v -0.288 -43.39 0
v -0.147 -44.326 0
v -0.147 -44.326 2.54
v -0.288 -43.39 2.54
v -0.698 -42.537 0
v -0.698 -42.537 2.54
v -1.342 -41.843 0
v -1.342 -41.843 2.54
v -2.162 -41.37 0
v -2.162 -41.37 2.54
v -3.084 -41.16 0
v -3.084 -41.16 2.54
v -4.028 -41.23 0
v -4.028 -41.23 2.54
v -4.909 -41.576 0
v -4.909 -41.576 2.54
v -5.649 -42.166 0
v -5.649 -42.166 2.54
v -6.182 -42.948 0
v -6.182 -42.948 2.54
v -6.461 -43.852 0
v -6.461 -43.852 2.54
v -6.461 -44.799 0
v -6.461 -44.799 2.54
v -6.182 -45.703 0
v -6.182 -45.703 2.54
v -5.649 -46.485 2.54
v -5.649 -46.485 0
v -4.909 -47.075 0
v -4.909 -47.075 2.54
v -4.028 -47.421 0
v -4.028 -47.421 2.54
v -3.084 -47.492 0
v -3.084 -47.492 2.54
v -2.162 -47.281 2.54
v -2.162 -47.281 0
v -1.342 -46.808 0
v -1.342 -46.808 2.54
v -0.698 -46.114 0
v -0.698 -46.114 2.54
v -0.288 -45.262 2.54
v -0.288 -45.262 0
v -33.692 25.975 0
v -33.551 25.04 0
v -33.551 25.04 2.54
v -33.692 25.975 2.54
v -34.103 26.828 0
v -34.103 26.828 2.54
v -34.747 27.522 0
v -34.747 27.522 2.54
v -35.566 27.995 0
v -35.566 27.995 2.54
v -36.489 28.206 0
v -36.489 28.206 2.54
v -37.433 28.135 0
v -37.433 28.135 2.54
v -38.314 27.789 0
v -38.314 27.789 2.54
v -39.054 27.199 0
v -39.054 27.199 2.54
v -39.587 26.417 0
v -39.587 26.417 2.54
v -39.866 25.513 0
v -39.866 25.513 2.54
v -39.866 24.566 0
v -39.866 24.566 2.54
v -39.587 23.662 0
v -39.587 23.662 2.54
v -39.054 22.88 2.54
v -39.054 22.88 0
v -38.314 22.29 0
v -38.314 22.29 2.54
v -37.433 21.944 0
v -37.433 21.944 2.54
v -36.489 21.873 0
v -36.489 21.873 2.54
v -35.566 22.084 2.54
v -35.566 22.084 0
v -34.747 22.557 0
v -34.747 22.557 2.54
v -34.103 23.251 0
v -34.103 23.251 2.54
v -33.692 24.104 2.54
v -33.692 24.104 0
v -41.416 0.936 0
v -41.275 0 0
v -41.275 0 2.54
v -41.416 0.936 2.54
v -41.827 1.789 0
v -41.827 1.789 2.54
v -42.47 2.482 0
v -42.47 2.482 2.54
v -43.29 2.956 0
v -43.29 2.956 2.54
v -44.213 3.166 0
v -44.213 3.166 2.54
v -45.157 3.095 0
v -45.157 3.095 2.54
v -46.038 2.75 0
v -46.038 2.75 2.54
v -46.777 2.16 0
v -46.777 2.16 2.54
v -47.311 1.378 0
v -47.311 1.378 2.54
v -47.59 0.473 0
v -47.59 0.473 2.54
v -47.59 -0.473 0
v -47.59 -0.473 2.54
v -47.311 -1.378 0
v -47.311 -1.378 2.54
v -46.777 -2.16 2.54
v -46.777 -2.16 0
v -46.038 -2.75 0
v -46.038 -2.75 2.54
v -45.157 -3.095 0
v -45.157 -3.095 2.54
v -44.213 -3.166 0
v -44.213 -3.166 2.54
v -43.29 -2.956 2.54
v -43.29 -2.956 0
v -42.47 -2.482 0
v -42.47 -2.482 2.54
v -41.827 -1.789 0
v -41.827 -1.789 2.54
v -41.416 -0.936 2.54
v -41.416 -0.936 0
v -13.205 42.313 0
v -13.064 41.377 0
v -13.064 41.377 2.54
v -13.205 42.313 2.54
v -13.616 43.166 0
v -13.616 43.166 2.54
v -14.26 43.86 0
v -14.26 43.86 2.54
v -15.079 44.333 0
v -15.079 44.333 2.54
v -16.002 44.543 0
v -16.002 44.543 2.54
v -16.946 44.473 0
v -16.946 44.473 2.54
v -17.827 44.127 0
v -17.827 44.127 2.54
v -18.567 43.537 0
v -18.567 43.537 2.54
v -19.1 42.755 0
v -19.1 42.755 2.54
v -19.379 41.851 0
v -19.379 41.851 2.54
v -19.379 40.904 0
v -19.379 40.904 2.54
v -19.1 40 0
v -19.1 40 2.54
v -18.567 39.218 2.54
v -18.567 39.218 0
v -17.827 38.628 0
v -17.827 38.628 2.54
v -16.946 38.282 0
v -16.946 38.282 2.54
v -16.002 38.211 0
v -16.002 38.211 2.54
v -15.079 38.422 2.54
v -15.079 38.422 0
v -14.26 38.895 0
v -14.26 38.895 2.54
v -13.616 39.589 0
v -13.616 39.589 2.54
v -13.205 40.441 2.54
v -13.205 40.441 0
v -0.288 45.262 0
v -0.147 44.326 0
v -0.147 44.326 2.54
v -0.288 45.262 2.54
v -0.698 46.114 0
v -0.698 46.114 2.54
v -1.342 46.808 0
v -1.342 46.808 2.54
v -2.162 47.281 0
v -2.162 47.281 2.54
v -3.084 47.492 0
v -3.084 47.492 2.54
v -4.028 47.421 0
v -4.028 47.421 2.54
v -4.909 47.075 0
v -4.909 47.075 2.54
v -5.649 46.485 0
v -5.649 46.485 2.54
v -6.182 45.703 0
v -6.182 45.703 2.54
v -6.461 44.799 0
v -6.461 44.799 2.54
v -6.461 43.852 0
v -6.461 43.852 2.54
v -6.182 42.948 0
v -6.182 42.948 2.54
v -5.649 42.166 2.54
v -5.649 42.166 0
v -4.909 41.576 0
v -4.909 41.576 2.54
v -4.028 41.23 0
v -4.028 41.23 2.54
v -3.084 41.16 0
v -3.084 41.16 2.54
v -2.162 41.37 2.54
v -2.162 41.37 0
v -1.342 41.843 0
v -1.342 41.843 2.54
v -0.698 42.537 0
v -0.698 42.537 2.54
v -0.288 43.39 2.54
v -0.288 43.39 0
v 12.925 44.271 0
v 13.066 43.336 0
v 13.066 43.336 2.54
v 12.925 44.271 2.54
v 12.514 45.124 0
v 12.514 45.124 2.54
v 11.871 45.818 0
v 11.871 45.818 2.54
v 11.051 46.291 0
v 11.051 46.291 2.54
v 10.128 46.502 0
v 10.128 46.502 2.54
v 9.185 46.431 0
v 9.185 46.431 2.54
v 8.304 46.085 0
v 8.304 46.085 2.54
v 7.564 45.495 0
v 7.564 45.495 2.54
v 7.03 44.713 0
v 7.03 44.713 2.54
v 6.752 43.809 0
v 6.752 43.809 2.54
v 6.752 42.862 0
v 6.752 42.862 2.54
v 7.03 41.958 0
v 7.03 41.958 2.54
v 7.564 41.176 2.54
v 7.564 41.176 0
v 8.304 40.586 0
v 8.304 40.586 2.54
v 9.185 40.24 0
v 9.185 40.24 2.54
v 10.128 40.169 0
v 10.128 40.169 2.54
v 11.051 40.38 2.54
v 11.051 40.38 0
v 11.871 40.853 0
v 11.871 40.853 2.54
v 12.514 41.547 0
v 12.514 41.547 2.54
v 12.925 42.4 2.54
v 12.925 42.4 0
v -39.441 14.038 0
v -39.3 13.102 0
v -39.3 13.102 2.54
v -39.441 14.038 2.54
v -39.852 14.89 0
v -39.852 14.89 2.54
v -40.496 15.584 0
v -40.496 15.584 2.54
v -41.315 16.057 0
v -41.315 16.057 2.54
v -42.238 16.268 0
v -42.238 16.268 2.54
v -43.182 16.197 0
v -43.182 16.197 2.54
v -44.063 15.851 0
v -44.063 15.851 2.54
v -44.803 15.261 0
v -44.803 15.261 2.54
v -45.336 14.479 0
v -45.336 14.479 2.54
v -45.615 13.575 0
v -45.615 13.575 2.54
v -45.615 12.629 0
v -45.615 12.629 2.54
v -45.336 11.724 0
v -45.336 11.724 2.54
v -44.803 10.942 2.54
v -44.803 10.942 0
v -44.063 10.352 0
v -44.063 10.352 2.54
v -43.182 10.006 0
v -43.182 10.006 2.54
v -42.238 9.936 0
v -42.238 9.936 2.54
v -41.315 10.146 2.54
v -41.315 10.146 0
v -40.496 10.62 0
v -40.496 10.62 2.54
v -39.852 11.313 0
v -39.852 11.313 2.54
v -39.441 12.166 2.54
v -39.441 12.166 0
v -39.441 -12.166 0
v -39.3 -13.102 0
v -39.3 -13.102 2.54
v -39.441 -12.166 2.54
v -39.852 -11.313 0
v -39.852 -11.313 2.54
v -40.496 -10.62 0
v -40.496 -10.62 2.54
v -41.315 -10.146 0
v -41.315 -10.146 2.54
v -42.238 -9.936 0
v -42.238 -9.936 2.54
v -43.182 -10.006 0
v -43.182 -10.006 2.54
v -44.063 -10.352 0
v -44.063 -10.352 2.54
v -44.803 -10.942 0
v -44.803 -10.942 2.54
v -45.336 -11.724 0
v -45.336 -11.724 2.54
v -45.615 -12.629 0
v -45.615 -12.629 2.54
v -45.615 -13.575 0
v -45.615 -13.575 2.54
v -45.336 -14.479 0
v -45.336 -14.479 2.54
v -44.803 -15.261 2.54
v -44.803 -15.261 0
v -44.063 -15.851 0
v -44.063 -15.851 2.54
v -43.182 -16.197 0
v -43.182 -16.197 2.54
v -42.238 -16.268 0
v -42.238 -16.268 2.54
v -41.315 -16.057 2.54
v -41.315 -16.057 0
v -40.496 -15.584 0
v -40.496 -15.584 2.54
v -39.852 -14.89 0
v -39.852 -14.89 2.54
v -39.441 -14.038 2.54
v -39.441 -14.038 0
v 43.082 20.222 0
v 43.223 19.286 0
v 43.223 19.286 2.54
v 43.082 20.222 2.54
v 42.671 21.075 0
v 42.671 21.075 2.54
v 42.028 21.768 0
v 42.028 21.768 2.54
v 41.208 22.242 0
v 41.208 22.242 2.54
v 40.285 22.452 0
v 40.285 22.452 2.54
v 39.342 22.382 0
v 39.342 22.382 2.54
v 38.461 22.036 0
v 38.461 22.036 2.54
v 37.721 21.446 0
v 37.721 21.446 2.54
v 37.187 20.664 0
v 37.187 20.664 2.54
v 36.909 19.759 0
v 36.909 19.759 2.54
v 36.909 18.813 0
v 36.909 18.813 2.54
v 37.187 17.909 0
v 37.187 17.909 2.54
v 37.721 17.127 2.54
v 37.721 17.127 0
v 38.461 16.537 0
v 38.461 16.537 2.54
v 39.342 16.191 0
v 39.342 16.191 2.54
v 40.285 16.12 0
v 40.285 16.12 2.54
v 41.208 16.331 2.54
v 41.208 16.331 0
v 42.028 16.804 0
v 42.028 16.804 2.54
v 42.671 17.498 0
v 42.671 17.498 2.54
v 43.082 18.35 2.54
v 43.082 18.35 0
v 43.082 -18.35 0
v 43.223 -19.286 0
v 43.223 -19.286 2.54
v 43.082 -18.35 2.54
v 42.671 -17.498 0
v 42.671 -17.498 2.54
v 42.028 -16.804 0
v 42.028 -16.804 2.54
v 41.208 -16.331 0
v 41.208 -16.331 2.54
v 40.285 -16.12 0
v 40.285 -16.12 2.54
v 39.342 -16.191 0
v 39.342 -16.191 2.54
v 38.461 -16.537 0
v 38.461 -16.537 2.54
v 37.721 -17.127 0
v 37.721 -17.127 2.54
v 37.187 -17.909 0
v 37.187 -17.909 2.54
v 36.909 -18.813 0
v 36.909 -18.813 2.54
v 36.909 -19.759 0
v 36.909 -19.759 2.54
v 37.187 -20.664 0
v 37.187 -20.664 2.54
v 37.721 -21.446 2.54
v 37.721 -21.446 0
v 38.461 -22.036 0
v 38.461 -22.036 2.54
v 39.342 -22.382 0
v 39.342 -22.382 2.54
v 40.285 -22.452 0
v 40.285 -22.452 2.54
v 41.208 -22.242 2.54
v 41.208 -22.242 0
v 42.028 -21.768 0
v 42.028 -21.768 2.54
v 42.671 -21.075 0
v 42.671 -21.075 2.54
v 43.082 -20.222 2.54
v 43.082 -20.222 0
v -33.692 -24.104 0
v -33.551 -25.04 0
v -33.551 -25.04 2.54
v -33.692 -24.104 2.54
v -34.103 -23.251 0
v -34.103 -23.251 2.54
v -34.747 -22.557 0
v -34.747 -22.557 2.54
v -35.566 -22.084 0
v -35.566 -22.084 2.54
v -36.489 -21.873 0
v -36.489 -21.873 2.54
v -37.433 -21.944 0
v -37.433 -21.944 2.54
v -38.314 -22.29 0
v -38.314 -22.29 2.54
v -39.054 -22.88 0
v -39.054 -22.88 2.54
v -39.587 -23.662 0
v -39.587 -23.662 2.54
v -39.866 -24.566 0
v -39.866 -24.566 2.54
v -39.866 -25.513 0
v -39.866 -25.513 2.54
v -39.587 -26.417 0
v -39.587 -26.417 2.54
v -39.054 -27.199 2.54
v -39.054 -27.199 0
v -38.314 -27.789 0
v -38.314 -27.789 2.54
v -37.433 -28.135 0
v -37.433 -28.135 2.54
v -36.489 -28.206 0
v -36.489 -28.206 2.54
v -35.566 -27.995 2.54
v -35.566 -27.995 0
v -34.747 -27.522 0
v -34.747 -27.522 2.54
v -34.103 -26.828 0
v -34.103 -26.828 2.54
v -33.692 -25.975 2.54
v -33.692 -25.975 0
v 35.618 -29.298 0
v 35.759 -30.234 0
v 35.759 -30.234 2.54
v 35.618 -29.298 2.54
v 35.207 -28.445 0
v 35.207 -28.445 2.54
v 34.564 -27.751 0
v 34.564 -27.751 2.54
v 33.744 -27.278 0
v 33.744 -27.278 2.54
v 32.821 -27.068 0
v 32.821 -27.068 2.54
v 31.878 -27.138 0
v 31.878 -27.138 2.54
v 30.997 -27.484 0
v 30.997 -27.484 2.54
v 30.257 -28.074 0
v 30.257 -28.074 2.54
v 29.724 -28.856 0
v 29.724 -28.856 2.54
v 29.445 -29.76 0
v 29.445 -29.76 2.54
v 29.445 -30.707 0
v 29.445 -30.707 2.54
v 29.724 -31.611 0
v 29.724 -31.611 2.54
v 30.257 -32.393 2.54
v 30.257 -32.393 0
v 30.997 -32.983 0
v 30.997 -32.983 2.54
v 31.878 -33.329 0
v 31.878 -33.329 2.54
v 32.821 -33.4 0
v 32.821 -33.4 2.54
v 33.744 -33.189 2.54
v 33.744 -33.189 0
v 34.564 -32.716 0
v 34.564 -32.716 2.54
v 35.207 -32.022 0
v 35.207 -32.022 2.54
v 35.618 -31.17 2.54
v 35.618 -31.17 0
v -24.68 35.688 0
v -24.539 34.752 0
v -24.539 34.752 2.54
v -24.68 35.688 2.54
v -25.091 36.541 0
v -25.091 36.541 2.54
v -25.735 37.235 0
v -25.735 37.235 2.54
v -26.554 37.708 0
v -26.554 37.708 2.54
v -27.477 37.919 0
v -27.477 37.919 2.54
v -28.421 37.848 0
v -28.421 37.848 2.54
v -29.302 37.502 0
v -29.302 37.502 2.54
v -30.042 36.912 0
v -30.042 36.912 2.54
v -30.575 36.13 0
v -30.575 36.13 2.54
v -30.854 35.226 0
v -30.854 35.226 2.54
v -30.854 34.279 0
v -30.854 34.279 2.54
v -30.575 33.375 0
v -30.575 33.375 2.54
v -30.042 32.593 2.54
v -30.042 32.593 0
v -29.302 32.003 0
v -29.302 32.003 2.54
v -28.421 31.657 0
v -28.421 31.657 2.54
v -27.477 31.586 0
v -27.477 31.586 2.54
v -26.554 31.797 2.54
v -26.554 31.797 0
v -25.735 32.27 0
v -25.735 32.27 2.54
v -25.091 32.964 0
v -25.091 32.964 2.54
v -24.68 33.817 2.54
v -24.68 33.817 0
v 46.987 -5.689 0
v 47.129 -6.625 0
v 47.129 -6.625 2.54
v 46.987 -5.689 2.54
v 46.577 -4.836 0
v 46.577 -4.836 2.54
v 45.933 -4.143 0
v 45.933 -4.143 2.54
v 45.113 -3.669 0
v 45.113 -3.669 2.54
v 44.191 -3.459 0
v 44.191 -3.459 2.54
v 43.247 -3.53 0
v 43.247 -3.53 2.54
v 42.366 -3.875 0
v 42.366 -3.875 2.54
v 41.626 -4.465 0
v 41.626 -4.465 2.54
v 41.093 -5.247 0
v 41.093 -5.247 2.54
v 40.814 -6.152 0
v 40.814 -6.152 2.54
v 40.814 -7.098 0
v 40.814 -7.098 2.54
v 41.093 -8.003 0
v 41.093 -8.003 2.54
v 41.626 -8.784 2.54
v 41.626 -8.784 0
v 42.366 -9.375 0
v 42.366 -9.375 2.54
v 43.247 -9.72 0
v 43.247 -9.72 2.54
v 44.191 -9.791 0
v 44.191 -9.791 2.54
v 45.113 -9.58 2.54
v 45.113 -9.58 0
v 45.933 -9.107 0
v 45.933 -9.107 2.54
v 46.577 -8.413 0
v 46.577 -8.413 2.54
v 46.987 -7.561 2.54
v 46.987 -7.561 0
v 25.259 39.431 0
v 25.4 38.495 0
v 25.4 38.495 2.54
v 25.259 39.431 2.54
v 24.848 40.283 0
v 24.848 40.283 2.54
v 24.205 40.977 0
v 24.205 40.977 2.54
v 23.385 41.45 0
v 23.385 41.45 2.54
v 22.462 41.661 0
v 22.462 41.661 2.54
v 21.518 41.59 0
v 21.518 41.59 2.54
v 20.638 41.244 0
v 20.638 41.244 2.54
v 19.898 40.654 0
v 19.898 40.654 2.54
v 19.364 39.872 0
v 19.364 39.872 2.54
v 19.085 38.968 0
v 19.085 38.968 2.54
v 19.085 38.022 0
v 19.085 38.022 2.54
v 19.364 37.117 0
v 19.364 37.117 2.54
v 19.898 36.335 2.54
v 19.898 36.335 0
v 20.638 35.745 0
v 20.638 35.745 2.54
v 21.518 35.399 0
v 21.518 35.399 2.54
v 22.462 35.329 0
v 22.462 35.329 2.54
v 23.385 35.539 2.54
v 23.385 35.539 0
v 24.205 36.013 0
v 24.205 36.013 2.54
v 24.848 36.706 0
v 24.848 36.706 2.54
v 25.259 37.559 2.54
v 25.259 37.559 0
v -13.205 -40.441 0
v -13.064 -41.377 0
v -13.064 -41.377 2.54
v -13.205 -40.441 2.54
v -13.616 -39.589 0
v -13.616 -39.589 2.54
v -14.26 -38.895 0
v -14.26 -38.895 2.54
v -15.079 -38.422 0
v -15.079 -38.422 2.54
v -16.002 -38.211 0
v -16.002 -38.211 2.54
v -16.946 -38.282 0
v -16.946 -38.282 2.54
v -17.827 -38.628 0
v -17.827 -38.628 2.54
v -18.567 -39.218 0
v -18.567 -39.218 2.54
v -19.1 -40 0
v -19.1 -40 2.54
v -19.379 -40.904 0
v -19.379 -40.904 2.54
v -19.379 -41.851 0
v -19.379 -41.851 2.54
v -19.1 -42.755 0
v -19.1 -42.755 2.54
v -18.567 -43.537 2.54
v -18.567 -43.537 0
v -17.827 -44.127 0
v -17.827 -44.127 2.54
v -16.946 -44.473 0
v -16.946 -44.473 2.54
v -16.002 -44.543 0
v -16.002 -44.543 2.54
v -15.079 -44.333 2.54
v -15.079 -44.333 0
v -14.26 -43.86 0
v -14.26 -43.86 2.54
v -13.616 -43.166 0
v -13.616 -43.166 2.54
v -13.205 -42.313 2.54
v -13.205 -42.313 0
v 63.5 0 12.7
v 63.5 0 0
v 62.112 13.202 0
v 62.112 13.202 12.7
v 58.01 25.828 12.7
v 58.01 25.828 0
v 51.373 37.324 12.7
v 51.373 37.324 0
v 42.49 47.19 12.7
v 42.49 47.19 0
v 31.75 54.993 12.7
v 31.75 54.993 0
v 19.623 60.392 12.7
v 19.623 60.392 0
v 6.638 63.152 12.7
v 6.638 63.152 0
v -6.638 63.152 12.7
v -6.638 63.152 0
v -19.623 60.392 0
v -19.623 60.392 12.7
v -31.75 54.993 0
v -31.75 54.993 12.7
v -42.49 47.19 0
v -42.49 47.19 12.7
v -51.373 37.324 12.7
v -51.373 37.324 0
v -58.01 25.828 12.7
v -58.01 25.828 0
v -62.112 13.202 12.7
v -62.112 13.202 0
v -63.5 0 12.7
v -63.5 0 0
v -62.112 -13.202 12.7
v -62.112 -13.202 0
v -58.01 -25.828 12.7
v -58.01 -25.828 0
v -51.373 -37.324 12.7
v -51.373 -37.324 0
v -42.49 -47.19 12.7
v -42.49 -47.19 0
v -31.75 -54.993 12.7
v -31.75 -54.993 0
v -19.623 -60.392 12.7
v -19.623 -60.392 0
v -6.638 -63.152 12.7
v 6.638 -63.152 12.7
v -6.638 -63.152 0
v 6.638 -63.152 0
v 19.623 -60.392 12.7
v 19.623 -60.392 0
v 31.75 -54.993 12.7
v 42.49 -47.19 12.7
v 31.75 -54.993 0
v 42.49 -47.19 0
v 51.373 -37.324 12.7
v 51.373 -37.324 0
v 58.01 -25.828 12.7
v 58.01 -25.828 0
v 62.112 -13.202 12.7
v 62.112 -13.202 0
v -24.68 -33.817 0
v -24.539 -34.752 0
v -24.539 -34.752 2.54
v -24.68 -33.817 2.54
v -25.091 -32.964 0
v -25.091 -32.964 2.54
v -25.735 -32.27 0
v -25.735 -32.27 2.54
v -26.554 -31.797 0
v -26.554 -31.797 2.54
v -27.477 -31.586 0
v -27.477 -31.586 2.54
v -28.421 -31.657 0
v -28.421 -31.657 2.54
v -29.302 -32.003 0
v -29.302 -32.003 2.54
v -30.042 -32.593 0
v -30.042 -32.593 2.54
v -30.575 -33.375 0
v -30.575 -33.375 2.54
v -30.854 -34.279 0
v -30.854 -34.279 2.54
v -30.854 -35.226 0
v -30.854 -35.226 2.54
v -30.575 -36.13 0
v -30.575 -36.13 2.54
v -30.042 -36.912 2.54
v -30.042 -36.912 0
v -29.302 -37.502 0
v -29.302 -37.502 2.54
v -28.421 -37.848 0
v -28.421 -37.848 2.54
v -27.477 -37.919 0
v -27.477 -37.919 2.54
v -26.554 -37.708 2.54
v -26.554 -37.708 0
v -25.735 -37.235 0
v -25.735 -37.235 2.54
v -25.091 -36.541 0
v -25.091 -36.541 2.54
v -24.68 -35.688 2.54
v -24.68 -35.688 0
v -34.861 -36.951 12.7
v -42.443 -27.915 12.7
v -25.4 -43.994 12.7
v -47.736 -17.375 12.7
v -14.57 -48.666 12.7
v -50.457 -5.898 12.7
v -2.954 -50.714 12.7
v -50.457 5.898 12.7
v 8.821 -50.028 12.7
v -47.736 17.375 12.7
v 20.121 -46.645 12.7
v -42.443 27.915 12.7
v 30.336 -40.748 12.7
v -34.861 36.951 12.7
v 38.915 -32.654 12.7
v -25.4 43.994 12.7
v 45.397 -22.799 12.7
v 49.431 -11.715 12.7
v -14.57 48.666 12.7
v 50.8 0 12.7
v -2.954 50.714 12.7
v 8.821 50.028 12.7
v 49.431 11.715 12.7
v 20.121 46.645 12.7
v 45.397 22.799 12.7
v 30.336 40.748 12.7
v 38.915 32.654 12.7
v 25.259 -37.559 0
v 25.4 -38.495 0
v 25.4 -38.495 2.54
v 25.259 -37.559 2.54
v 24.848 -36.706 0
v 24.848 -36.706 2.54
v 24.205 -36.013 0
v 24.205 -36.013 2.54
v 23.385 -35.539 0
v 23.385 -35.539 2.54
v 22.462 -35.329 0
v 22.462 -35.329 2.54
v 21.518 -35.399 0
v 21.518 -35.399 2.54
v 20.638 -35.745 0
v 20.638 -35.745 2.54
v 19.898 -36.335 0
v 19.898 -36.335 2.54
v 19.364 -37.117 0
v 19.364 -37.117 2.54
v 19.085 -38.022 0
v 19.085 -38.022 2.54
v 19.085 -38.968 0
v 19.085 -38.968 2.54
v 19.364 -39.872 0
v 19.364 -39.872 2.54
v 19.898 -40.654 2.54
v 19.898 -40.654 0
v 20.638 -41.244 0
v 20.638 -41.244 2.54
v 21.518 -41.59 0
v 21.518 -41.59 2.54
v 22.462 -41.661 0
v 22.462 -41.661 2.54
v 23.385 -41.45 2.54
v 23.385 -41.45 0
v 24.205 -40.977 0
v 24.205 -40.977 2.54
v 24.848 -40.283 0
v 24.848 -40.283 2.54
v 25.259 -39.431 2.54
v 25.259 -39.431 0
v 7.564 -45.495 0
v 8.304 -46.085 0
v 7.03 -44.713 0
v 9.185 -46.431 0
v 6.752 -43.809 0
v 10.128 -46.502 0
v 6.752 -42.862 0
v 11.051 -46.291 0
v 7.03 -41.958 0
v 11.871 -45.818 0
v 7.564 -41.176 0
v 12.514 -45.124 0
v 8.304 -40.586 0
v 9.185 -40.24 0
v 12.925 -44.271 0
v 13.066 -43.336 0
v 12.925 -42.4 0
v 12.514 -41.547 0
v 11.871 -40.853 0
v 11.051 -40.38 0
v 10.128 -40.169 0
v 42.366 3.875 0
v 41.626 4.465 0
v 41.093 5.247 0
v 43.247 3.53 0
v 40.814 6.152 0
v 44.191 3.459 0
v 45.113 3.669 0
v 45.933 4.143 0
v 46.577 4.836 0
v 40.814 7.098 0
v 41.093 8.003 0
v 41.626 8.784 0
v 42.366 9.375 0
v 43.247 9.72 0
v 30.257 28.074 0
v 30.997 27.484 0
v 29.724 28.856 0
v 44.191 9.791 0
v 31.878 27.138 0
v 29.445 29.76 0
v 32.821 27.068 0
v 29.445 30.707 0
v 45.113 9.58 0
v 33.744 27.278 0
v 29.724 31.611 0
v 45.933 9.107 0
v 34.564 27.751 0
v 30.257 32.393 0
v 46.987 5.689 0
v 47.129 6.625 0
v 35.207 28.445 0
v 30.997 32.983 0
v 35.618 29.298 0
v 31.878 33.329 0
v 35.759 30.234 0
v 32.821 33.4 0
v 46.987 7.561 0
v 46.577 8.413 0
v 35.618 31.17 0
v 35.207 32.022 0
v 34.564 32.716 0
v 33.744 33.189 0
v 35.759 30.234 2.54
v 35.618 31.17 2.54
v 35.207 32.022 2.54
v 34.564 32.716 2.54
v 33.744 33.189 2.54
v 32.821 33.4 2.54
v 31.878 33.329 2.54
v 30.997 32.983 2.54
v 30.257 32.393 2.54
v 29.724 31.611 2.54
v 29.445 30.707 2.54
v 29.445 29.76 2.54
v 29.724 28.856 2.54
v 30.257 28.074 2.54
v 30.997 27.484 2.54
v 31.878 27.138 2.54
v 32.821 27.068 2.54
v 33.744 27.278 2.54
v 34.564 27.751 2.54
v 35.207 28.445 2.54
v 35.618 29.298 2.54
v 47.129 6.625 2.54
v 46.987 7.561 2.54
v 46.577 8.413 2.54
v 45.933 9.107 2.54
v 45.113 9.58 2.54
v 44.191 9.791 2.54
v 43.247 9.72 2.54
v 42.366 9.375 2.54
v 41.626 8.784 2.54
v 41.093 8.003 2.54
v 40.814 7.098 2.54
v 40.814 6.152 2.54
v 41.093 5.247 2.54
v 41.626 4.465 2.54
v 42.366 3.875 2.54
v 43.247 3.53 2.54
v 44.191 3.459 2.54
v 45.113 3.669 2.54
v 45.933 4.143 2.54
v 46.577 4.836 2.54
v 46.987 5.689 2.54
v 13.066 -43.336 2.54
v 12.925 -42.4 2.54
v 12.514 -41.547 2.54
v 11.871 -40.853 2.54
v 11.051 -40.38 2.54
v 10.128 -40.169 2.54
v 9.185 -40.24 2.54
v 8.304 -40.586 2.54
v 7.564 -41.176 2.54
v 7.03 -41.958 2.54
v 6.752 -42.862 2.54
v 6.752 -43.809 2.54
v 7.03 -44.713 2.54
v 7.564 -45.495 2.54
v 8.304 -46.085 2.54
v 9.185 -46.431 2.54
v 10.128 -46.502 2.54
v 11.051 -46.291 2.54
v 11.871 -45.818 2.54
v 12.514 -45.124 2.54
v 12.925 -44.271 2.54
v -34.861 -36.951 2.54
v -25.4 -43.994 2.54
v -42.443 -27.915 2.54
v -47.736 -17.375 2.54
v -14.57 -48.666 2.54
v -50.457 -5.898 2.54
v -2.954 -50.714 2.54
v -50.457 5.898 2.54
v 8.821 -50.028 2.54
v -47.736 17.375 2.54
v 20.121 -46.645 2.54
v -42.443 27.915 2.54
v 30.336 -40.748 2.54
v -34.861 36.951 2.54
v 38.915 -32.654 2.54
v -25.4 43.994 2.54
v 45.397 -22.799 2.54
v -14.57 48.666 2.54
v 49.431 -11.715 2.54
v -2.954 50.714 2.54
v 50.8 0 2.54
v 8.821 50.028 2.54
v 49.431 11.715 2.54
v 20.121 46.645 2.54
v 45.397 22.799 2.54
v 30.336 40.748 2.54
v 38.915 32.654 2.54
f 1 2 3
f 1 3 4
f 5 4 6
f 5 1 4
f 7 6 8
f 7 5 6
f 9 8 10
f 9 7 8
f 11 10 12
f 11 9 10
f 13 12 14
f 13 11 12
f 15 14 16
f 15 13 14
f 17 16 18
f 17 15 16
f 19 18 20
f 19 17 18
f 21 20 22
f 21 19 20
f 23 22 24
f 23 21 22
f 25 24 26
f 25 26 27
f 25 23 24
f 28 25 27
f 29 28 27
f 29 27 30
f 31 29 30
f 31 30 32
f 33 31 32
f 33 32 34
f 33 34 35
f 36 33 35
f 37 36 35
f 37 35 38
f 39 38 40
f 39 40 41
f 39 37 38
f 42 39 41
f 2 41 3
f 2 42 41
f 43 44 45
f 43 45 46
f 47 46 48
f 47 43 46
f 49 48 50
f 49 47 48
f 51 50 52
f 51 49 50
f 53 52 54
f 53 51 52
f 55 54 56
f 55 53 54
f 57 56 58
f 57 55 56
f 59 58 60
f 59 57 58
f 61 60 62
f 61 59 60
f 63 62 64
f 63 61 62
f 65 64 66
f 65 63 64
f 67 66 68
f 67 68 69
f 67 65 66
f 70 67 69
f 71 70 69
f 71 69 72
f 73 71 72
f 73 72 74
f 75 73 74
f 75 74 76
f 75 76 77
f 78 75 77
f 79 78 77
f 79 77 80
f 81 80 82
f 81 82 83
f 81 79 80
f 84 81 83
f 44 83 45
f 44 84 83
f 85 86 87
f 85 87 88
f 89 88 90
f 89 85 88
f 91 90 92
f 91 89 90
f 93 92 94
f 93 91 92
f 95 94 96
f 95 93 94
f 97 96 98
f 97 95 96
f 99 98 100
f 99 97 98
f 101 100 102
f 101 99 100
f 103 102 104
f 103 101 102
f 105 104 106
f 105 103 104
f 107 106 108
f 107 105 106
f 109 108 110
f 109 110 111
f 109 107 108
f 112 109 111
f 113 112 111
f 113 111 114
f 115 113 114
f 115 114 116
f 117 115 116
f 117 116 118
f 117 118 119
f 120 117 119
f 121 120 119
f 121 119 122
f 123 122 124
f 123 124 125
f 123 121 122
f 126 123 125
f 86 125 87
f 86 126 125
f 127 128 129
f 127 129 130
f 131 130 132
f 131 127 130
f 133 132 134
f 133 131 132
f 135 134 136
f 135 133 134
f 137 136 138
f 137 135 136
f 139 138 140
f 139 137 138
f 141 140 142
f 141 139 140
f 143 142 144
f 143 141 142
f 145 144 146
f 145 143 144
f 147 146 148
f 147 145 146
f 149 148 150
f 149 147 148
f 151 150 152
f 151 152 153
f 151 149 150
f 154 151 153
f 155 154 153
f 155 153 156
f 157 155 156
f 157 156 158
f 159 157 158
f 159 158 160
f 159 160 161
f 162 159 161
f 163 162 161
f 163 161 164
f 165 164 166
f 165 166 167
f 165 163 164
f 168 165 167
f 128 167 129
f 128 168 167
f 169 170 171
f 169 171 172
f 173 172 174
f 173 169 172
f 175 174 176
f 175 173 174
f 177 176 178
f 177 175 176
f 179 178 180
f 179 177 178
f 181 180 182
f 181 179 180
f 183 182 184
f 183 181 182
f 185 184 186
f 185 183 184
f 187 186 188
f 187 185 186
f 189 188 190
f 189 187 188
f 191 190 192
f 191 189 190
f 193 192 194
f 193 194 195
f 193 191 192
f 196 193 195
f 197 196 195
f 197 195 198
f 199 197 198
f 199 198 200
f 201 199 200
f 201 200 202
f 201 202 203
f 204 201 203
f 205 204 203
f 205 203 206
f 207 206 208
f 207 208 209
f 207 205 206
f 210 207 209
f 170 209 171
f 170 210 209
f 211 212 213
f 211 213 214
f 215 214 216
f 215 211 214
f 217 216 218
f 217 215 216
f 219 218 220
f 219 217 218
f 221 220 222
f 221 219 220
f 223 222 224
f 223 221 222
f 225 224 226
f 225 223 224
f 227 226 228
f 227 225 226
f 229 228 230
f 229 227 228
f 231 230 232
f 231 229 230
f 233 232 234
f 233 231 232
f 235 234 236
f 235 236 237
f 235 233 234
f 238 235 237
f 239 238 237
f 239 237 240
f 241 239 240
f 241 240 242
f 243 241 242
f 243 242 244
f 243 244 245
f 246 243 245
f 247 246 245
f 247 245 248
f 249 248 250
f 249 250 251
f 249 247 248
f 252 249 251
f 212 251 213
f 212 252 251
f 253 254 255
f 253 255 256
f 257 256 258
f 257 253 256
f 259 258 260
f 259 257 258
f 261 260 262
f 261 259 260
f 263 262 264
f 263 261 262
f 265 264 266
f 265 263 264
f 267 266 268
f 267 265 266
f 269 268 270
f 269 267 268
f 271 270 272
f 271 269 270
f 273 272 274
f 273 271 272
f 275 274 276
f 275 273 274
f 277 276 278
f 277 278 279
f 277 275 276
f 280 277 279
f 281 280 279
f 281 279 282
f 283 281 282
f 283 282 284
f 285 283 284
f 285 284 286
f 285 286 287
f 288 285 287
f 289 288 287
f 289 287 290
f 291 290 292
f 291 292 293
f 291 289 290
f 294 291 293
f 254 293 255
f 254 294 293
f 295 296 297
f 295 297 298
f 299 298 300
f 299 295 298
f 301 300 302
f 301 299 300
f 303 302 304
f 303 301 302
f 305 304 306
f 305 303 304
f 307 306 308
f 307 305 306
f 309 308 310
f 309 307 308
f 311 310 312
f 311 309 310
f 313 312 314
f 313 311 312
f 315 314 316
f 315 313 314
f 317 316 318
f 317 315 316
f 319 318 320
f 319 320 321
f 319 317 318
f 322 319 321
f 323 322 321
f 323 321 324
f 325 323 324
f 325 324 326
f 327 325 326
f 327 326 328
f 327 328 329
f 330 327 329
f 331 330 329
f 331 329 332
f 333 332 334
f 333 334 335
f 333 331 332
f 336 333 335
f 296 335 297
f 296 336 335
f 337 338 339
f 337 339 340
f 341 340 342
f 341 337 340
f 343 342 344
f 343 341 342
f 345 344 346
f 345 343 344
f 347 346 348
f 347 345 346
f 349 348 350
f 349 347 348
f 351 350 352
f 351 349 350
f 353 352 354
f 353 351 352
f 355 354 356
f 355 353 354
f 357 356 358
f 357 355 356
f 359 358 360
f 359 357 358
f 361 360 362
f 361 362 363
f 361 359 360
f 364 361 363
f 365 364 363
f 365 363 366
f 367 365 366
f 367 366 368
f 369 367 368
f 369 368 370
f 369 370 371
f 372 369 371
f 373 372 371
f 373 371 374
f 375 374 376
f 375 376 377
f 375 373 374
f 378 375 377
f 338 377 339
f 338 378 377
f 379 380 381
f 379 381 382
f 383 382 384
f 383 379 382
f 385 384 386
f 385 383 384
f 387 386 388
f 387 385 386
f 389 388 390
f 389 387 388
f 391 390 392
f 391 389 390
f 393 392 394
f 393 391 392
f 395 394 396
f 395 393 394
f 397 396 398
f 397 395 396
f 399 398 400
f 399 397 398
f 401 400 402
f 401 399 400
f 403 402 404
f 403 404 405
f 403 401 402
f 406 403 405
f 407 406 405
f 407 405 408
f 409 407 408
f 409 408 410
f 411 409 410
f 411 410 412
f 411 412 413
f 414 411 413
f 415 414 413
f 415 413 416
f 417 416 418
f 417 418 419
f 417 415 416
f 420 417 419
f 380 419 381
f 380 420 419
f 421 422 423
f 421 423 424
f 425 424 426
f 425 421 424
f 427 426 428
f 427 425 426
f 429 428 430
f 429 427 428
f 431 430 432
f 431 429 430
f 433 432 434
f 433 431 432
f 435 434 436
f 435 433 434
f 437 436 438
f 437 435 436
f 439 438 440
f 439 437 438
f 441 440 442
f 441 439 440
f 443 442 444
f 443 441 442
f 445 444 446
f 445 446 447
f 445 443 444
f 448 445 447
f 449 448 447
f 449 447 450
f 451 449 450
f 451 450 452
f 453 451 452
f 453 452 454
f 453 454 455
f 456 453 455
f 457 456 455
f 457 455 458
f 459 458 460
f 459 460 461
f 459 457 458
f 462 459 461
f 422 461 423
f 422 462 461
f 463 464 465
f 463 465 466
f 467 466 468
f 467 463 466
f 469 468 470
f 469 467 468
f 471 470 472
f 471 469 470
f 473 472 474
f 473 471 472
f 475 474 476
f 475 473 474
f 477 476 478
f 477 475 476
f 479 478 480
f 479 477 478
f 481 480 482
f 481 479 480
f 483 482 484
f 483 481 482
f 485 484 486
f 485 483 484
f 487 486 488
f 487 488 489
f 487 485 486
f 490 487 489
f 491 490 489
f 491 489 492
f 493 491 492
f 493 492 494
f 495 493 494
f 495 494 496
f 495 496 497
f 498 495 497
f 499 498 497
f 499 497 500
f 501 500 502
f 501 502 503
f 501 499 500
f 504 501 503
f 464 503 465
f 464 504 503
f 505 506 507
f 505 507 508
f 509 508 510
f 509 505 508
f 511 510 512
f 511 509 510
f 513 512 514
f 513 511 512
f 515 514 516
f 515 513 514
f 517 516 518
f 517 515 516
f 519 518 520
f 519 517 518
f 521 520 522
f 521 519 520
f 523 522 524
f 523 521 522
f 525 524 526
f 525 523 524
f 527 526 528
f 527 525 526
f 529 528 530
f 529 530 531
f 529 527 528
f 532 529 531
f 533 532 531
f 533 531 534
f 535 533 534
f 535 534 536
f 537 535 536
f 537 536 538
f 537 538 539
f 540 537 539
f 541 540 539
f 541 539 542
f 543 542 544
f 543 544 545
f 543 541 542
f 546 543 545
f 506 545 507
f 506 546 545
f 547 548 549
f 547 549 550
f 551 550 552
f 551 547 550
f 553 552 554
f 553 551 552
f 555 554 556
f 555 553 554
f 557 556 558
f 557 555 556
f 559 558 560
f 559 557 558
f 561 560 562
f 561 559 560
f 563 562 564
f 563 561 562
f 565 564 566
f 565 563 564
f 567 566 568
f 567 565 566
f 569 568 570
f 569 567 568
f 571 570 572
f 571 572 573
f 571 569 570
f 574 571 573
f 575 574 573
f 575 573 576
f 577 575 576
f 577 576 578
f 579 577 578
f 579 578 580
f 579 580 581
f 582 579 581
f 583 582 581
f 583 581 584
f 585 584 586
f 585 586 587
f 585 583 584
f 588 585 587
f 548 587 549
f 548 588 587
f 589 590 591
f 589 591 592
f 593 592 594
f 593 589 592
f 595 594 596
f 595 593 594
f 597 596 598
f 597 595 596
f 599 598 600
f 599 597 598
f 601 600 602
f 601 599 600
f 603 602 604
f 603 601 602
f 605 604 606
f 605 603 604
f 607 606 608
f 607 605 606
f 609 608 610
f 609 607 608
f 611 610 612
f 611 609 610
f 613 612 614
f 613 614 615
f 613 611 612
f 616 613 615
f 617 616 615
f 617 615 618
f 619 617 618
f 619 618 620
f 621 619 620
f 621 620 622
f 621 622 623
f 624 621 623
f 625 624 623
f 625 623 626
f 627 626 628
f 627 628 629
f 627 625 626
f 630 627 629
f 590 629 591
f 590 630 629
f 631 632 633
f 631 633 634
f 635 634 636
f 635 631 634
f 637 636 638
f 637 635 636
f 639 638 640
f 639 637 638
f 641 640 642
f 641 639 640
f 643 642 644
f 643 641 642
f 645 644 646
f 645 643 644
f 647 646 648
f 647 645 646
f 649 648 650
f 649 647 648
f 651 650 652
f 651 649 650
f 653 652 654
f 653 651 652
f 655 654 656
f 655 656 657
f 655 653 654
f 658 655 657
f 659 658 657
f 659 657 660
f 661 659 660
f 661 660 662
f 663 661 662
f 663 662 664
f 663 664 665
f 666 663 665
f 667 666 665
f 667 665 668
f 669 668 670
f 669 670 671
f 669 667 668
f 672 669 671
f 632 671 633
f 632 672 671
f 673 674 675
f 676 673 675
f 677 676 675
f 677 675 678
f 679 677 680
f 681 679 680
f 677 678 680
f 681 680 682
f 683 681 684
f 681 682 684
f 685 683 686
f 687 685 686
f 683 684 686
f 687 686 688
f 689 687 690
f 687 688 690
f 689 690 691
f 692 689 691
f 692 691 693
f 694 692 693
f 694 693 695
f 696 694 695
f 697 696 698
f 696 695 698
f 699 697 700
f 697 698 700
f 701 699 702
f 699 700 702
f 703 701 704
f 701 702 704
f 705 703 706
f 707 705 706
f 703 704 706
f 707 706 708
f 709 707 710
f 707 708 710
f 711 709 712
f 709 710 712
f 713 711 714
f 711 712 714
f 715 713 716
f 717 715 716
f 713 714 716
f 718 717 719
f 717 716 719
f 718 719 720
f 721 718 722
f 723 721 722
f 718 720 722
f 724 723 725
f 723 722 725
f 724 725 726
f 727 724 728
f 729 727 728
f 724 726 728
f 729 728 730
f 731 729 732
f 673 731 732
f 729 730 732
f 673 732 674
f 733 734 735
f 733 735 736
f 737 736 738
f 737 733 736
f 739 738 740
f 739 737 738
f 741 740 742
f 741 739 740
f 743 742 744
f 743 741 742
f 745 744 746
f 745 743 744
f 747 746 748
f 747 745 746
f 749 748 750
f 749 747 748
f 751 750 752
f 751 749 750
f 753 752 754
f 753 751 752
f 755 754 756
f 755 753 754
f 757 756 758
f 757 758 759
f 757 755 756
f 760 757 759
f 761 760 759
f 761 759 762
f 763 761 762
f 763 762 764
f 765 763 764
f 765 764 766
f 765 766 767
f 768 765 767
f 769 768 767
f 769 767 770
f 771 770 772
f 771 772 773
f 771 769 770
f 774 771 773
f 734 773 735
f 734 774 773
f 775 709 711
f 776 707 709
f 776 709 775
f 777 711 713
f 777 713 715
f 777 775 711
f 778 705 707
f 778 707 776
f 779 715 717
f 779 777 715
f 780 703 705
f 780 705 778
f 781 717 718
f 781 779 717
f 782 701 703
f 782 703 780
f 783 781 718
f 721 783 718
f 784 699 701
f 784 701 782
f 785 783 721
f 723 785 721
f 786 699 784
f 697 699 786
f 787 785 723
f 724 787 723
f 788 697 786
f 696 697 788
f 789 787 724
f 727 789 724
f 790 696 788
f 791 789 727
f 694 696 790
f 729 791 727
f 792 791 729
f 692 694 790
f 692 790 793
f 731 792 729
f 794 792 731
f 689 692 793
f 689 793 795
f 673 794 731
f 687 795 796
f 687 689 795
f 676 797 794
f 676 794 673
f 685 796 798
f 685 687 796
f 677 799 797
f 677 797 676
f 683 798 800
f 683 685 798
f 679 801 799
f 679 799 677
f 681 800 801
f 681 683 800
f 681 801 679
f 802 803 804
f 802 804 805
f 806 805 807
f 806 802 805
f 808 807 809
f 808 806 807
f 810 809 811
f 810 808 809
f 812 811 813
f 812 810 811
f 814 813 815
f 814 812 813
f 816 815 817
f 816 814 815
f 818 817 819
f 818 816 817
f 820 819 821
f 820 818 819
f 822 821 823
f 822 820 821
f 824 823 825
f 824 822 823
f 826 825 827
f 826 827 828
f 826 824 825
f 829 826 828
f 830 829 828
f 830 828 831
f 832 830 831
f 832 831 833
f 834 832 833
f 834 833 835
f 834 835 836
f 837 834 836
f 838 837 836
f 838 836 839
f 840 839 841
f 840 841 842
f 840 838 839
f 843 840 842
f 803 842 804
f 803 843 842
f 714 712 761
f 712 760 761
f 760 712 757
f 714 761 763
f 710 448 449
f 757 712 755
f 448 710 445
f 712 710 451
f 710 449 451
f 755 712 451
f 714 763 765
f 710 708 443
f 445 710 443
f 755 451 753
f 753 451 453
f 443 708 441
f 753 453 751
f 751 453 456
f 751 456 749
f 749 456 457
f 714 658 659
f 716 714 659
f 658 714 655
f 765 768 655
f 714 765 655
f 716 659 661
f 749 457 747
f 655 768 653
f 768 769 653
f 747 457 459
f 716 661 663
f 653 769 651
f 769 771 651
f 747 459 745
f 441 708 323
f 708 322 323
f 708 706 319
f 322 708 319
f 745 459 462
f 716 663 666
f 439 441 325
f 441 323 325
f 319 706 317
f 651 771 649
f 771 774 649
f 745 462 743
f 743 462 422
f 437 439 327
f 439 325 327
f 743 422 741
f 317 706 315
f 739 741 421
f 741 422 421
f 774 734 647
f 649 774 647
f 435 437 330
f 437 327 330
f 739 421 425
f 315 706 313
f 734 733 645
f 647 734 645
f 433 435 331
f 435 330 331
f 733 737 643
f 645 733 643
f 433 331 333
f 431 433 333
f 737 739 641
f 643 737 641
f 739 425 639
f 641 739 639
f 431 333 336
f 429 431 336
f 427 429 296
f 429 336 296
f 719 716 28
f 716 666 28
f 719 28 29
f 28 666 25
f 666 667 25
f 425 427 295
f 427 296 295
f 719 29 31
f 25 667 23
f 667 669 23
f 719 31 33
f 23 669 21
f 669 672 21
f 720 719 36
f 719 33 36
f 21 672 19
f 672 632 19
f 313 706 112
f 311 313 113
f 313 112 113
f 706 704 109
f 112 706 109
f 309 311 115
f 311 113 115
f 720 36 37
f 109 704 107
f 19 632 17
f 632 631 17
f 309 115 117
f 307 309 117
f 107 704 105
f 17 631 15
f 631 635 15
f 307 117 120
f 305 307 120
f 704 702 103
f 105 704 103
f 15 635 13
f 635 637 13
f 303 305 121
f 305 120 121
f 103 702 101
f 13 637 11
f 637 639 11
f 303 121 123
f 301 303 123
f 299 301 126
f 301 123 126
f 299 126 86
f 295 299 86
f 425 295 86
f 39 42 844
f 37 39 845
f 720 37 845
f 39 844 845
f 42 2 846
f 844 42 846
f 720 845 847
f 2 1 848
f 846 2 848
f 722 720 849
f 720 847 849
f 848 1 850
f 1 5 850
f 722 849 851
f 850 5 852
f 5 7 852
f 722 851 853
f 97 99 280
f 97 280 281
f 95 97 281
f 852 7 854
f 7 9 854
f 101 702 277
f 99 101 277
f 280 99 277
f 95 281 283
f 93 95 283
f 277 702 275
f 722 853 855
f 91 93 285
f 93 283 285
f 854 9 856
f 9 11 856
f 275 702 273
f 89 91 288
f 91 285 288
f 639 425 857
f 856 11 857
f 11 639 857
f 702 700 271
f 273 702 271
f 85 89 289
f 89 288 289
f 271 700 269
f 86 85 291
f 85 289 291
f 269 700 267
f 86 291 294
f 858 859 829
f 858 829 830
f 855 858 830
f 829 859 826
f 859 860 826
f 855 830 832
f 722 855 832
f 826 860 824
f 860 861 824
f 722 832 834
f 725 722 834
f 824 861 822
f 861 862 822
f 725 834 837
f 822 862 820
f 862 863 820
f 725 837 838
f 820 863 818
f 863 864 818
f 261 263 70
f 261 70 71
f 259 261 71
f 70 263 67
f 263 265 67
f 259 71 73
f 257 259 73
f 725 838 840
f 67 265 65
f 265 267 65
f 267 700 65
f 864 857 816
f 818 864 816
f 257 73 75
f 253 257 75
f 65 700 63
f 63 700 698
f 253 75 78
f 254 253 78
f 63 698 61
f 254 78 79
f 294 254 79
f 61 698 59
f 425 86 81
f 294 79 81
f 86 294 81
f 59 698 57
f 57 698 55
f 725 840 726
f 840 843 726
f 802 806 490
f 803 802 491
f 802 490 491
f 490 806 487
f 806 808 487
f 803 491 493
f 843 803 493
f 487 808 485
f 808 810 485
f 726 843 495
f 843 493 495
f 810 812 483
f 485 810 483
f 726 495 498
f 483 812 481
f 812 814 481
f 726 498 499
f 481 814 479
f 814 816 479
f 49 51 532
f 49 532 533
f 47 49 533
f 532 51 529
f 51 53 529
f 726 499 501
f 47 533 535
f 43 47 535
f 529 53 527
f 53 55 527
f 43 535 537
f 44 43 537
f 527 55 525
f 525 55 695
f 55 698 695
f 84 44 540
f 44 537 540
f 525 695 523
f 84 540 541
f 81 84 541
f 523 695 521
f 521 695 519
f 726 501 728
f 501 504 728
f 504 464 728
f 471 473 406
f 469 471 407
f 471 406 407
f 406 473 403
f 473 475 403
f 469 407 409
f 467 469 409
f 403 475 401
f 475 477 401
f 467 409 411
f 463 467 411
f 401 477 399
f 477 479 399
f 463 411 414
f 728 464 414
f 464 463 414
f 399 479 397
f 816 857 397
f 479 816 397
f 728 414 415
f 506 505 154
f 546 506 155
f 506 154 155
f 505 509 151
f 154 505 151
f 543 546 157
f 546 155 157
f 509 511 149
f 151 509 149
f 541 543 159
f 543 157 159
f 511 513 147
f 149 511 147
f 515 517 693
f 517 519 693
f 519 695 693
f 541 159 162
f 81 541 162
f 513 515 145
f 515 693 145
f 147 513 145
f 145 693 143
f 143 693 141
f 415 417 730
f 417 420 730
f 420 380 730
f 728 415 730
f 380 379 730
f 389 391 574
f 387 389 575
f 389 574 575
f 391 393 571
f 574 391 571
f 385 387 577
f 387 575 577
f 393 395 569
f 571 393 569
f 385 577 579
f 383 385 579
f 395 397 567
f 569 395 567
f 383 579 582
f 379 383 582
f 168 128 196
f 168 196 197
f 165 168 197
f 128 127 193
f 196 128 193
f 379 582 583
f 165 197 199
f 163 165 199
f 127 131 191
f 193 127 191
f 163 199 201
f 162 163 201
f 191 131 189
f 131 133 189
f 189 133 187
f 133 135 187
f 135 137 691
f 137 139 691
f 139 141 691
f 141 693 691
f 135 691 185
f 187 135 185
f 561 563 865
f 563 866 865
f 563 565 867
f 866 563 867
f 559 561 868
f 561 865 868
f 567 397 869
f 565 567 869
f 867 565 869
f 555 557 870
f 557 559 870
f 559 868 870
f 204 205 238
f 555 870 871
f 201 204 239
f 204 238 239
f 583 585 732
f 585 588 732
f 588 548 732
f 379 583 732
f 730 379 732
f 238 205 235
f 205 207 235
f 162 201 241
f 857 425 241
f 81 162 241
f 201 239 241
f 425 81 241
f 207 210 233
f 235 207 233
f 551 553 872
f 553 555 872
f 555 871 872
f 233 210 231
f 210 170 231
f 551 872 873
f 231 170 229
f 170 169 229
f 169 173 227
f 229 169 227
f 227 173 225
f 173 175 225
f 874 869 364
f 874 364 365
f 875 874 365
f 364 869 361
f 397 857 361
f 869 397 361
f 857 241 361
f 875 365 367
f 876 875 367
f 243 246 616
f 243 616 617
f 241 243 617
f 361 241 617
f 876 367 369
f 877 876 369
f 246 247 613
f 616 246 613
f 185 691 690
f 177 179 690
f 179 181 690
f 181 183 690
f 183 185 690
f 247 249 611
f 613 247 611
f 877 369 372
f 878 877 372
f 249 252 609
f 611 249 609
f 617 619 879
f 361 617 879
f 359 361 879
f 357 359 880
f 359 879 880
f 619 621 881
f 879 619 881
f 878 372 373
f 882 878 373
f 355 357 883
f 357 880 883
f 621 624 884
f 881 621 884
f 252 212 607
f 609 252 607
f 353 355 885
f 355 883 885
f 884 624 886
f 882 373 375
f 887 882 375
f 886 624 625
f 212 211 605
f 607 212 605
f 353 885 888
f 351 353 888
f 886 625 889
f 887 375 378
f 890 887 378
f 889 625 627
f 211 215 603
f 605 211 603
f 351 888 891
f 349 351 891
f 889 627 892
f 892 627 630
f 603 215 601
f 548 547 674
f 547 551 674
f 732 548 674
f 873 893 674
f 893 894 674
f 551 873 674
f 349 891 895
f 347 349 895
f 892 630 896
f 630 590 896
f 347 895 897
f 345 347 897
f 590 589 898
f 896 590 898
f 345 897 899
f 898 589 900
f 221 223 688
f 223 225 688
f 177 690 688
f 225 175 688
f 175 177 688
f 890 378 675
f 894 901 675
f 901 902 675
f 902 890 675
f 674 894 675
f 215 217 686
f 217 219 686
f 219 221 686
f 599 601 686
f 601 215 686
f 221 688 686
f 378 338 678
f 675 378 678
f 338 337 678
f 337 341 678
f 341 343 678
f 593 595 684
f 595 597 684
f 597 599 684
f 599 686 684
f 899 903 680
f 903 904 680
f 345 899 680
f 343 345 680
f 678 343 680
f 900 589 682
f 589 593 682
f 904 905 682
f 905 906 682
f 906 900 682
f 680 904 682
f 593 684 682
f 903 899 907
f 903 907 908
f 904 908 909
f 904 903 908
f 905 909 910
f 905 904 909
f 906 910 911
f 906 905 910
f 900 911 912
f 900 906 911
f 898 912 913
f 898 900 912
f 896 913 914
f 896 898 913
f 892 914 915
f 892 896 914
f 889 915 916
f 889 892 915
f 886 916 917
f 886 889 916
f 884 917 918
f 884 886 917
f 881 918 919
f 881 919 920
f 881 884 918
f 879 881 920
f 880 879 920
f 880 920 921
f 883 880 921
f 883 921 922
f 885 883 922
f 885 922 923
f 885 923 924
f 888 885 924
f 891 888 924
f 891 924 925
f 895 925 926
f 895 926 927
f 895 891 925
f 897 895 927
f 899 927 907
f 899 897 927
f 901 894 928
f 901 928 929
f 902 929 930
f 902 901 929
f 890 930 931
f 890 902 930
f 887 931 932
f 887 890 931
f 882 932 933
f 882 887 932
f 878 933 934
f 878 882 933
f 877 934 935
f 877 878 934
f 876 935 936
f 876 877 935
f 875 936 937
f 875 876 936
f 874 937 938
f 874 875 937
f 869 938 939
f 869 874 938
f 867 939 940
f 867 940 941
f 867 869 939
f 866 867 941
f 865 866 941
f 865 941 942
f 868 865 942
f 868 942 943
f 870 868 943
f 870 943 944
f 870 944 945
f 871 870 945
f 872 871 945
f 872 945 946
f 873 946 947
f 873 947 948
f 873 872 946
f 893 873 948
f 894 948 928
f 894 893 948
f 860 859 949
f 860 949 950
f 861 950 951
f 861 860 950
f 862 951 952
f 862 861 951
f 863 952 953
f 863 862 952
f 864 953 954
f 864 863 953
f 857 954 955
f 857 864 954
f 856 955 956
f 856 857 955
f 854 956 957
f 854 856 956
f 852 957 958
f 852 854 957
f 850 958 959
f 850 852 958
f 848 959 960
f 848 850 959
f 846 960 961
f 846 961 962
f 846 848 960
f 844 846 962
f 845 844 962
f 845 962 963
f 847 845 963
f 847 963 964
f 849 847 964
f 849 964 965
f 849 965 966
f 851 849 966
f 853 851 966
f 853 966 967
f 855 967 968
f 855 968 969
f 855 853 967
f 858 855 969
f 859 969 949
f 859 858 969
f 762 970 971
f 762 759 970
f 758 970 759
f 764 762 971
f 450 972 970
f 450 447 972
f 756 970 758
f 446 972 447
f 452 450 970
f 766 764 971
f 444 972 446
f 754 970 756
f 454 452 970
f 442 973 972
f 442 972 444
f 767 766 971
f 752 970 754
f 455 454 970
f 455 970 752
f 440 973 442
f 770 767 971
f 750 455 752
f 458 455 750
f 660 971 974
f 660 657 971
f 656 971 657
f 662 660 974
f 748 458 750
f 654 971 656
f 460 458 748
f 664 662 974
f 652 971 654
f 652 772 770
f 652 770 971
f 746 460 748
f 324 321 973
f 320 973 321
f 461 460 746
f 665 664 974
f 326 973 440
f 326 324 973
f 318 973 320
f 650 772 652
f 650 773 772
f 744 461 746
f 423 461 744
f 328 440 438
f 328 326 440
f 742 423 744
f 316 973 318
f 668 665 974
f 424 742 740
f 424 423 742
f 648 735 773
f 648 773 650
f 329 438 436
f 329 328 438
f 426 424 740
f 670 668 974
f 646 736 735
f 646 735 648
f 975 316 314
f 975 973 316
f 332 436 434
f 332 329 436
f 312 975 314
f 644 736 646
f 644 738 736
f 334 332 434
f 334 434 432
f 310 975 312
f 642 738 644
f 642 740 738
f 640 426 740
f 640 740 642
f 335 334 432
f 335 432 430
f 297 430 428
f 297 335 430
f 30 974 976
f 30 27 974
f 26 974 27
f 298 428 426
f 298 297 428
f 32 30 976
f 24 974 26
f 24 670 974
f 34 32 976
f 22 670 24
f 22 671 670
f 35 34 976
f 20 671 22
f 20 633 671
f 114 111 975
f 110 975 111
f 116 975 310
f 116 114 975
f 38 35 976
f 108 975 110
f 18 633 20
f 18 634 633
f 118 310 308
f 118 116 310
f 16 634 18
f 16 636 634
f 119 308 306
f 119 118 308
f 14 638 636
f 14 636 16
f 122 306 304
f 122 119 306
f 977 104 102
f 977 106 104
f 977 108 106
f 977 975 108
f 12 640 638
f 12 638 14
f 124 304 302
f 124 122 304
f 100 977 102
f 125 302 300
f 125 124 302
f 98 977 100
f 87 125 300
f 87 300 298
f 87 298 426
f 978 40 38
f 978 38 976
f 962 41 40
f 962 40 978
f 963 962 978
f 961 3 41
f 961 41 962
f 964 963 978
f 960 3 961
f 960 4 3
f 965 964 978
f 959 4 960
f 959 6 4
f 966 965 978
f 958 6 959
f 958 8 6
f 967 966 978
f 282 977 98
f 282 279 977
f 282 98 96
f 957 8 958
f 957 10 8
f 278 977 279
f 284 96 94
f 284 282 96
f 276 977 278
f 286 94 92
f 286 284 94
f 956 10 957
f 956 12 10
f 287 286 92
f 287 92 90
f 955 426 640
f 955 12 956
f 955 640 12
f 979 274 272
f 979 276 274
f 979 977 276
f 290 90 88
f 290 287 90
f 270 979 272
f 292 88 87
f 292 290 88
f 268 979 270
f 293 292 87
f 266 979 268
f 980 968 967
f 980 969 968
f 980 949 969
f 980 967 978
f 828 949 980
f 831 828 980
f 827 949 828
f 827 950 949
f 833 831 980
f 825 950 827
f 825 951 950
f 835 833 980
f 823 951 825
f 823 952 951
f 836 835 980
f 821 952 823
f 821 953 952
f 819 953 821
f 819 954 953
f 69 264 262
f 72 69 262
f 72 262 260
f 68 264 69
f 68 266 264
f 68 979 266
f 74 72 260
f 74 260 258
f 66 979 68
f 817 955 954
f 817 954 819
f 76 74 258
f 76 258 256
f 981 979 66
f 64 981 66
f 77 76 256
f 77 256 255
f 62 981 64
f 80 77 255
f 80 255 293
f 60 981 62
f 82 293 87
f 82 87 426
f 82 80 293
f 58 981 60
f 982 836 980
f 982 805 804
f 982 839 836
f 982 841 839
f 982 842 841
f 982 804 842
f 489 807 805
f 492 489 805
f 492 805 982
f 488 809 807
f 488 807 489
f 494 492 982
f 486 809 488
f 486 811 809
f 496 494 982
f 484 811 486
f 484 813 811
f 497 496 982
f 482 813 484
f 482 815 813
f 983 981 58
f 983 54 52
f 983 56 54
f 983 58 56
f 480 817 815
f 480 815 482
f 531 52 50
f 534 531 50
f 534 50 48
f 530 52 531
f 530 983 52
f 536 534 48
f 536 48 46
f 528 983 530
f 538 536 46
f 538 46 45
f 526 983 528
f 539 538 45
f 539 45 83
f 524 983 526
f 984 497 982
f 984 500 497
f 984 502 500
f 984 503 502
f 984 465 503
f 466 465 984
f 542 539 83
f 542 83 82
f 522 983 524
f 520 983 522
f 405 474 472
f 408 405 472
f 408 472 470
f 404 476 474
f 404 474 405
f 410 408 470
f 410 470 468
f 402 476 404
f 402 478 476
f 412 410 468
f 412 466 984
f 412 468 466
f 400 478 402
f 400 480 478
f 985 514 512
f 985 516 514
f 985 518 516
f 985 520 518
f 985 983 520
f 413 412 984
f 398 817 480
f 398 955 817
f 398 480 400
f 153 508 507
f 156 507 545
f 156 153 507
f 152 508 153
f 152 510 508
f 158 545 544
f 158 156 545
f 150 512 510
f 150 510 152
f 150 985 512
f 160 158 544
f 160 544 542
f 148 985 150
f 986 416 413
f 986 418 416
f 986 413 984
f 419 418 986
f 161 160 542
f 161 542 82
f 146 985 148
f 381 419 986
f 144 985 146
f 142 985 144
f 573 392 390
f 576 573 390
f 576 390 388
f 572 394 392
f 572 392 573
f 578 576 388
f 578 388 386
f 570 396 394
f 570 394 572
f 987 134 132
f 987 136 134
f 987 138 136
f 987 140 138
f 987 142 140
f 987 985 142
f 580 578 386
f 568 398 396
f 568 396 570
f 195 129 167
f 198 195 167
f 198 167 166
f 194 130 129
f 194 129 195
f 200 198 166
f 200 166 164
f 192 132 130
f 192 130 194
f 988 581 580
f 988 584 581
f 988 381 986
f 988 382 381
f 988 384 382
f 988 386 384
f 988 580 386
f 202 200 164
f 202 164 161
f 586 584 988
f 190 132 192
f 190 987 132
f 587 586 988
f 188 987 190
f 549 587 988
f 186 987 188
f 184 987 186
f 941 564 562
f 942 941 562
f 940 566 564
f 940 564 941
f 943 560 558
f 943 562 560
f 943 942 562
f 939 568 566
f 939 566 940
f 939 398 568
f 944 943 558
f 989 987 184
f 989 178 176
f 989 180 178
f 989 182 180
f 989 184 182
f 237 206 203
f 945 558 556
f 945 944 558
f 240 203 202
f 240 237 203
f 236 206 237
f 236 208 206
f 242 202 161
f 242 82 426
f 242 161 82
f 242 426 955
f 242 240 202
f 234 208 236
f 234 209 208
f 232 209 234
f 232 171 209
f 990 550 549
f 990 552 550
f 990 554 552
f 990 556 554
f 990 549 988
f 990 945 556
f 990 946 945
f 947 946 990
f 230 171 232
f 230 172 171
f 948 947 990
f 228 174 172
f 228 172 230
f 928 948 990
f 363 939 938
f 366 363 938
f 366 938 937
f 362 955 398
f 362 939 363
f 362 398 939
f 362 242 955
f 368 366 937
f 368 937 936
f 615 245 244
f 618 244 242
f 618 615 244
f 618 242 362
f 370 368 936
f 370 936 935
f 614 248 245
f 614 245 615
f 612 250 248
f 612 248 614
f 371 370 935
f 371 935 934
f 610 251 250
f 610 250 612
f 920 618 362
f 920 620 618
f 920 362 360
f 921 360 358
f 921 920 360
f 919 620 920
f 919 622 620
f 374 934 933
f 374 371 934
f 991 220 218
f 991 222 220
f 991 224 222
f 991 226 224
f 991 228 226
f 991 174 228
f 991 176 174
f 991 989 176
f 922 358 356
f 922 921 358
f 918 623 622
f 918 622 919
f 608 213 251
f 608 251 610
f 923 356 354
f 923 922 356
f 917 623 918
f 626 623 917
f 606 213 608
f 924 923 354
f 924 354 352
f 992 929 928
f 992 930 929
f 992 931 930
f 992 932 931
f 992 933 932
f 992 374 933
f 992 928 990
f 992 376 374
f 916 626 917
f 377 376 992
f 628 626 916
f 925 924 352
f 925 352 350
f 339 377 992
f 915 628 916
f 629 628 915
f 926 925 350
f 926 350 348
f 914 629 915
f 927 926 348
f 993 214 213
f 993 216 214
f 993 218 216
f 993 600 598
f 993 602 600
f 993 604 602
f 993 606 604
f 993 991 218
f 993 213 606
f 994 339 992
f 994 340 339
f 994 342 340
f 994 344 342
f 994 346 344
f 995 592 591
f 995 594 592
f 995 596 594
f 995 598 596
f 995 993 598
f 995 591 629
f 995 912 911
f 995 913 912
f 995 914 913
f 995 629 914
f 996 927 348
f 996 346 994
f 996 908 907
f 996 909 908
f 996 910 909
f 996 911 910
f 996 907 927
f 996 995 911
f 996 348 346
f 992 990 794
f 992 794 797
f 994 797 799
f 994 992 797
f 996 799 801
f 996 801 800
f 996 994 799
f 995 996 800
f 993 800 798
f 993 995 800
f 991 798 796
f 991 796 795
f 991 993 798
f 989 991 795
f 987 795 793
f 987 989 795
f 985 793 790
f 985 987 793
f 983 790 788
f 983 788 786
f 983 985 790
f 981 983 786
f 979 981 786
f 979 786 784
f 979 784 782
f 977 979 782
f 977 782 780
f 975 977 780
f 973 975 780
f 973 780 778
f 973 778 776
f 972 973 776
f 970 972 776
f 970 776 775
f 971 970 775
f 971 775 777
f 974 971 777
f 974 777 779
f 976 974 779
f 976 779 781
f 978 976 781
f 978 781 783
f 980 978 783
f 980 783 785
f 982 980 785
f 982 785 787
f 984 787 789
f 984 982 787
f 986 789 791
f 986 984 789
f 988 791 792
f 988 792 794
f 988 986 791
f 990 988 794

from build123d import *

# Parameters (mm, degrees)
SKETCH4_R           = 63.5
SKETCH4_R_2         = 50.8
BOSS_EXTRUDE4_DEPTH = 12.7
SKETCH1_R           = 50.8
SKETCH1_R_2         = 3.175
BOSS_EXTRUDE5_DEPTH = 2.54


with BuildPart() as part:
    # Sketch4 → Boss-Extrude4 (new body)
    with BuildSketch(Plane.XY):
        Circle(SKETCH4_R)
        Circle(SKETCH4_R_2, mode=Mode.SUBTRACT)
    extrude(amount=BOSS_EXTRUDE4_DEPTH)

    # Sketch1 → Boss-Extrude5 (add)
    with BuildSketch(Plane.XY):
        Circle(SKETCH1_R)
        with Locations((-44.45, 0)):
            Circle(SKETCH1_R_2, mode=Mode.SUBTRACT)
        with Locations((-42.475211217, 13.101867503)):
            Circle(SKETCH1_R_2, mode=Mode.SUBTRACT)
        with Locations((-36.726313518, 25.039576581)):
            Circle(SKETCH1_R_2, mode=Mode.SUBTRACT)
        with Locations((-27.714121693, 34.752409396)):
            Circle(SKETCH1_R_2, mode=Mode.SUBTRACT)
        with Locations((-16.239408533, 41.377338127)):
            Circle(SKETCH1_R_2, mode=Mode.SUBTRACT)
        with Locations((-3.32175266, 44.325708785)):
            Circle(SKETCH1_R_2, mode=Mode.SUBTRACT)
        with Locations((9.891055514, 43.335545696)):
            Circle(SKETCH1_R_2, mode=Mode.SUBTRACT)
        with Locations((22.225, 38.494829198)):
            Circle(SKETCH1_R_2, mode=Mode.SUBTRACT)
        with Locations((32.584155703, 30.233678194)):
            Circle(SKETCH1_R_2, mode=Mode.SUBTRACT)
        with Locations((40.048066178, 19.286132204)):
            Circle(SKETCH1_R_2, mode=Mode.SUBTRACT)
        with Locations((43.953530226, 6.624928732)):
            Circle(SKETCH1_R_2, mode=Mode.SUBTRACT)
        with Locations((43.953530226, -6.624928732)):
            Circle(SKETCH1_R_2, mode=Mode.SUBTRACT)
        with Locations((40.048066178, -19.286132204)):
            Circle(SKETCH1_R_2, mode=Mode.SUBTRACT)
        with Locations((32.584155703, -30.233678194)):
            Circle(SKETCH1_R_2, mode=Mode.SUBTRACT)
        with Locations((22.225, -38.494829198)):
            Circle(SKETCH1_R_2, mode=Mode.SUBTRACT)
        with Locations((9.891055514, -43.335545696)):
            Circle(SKETCH1_R_2, mode=Mode.SUBTRACT)
        with Locations((-3.32175266, -44.325708785)):
            Circle(SKETCH1_R_2, mode=Mode.SUBTRACT)
        with Locations((-16.239408533, -41.377338127)):
            Circle(SKETCH1_R_2, mode=Mode.SUBTRACT)
        with Locations((-27.714121693, -34.752409396)):
            Circle(SKETCH1_R_2, mode=Mode.SUBTRACT)
        with Locations((-36.726313518, -25.039576581)):
            Circle(SKETCH1_R_2, mode=Mode.SUBTRACT)
        with Locations((-42.475211217, -13.101867503)):
            Circle(SKETCH1_R_2, mode=Mode.SUBTRACT)
    extrude(amount=BOSS_EXTRUDE5_DEPTH)


solid = part.part
